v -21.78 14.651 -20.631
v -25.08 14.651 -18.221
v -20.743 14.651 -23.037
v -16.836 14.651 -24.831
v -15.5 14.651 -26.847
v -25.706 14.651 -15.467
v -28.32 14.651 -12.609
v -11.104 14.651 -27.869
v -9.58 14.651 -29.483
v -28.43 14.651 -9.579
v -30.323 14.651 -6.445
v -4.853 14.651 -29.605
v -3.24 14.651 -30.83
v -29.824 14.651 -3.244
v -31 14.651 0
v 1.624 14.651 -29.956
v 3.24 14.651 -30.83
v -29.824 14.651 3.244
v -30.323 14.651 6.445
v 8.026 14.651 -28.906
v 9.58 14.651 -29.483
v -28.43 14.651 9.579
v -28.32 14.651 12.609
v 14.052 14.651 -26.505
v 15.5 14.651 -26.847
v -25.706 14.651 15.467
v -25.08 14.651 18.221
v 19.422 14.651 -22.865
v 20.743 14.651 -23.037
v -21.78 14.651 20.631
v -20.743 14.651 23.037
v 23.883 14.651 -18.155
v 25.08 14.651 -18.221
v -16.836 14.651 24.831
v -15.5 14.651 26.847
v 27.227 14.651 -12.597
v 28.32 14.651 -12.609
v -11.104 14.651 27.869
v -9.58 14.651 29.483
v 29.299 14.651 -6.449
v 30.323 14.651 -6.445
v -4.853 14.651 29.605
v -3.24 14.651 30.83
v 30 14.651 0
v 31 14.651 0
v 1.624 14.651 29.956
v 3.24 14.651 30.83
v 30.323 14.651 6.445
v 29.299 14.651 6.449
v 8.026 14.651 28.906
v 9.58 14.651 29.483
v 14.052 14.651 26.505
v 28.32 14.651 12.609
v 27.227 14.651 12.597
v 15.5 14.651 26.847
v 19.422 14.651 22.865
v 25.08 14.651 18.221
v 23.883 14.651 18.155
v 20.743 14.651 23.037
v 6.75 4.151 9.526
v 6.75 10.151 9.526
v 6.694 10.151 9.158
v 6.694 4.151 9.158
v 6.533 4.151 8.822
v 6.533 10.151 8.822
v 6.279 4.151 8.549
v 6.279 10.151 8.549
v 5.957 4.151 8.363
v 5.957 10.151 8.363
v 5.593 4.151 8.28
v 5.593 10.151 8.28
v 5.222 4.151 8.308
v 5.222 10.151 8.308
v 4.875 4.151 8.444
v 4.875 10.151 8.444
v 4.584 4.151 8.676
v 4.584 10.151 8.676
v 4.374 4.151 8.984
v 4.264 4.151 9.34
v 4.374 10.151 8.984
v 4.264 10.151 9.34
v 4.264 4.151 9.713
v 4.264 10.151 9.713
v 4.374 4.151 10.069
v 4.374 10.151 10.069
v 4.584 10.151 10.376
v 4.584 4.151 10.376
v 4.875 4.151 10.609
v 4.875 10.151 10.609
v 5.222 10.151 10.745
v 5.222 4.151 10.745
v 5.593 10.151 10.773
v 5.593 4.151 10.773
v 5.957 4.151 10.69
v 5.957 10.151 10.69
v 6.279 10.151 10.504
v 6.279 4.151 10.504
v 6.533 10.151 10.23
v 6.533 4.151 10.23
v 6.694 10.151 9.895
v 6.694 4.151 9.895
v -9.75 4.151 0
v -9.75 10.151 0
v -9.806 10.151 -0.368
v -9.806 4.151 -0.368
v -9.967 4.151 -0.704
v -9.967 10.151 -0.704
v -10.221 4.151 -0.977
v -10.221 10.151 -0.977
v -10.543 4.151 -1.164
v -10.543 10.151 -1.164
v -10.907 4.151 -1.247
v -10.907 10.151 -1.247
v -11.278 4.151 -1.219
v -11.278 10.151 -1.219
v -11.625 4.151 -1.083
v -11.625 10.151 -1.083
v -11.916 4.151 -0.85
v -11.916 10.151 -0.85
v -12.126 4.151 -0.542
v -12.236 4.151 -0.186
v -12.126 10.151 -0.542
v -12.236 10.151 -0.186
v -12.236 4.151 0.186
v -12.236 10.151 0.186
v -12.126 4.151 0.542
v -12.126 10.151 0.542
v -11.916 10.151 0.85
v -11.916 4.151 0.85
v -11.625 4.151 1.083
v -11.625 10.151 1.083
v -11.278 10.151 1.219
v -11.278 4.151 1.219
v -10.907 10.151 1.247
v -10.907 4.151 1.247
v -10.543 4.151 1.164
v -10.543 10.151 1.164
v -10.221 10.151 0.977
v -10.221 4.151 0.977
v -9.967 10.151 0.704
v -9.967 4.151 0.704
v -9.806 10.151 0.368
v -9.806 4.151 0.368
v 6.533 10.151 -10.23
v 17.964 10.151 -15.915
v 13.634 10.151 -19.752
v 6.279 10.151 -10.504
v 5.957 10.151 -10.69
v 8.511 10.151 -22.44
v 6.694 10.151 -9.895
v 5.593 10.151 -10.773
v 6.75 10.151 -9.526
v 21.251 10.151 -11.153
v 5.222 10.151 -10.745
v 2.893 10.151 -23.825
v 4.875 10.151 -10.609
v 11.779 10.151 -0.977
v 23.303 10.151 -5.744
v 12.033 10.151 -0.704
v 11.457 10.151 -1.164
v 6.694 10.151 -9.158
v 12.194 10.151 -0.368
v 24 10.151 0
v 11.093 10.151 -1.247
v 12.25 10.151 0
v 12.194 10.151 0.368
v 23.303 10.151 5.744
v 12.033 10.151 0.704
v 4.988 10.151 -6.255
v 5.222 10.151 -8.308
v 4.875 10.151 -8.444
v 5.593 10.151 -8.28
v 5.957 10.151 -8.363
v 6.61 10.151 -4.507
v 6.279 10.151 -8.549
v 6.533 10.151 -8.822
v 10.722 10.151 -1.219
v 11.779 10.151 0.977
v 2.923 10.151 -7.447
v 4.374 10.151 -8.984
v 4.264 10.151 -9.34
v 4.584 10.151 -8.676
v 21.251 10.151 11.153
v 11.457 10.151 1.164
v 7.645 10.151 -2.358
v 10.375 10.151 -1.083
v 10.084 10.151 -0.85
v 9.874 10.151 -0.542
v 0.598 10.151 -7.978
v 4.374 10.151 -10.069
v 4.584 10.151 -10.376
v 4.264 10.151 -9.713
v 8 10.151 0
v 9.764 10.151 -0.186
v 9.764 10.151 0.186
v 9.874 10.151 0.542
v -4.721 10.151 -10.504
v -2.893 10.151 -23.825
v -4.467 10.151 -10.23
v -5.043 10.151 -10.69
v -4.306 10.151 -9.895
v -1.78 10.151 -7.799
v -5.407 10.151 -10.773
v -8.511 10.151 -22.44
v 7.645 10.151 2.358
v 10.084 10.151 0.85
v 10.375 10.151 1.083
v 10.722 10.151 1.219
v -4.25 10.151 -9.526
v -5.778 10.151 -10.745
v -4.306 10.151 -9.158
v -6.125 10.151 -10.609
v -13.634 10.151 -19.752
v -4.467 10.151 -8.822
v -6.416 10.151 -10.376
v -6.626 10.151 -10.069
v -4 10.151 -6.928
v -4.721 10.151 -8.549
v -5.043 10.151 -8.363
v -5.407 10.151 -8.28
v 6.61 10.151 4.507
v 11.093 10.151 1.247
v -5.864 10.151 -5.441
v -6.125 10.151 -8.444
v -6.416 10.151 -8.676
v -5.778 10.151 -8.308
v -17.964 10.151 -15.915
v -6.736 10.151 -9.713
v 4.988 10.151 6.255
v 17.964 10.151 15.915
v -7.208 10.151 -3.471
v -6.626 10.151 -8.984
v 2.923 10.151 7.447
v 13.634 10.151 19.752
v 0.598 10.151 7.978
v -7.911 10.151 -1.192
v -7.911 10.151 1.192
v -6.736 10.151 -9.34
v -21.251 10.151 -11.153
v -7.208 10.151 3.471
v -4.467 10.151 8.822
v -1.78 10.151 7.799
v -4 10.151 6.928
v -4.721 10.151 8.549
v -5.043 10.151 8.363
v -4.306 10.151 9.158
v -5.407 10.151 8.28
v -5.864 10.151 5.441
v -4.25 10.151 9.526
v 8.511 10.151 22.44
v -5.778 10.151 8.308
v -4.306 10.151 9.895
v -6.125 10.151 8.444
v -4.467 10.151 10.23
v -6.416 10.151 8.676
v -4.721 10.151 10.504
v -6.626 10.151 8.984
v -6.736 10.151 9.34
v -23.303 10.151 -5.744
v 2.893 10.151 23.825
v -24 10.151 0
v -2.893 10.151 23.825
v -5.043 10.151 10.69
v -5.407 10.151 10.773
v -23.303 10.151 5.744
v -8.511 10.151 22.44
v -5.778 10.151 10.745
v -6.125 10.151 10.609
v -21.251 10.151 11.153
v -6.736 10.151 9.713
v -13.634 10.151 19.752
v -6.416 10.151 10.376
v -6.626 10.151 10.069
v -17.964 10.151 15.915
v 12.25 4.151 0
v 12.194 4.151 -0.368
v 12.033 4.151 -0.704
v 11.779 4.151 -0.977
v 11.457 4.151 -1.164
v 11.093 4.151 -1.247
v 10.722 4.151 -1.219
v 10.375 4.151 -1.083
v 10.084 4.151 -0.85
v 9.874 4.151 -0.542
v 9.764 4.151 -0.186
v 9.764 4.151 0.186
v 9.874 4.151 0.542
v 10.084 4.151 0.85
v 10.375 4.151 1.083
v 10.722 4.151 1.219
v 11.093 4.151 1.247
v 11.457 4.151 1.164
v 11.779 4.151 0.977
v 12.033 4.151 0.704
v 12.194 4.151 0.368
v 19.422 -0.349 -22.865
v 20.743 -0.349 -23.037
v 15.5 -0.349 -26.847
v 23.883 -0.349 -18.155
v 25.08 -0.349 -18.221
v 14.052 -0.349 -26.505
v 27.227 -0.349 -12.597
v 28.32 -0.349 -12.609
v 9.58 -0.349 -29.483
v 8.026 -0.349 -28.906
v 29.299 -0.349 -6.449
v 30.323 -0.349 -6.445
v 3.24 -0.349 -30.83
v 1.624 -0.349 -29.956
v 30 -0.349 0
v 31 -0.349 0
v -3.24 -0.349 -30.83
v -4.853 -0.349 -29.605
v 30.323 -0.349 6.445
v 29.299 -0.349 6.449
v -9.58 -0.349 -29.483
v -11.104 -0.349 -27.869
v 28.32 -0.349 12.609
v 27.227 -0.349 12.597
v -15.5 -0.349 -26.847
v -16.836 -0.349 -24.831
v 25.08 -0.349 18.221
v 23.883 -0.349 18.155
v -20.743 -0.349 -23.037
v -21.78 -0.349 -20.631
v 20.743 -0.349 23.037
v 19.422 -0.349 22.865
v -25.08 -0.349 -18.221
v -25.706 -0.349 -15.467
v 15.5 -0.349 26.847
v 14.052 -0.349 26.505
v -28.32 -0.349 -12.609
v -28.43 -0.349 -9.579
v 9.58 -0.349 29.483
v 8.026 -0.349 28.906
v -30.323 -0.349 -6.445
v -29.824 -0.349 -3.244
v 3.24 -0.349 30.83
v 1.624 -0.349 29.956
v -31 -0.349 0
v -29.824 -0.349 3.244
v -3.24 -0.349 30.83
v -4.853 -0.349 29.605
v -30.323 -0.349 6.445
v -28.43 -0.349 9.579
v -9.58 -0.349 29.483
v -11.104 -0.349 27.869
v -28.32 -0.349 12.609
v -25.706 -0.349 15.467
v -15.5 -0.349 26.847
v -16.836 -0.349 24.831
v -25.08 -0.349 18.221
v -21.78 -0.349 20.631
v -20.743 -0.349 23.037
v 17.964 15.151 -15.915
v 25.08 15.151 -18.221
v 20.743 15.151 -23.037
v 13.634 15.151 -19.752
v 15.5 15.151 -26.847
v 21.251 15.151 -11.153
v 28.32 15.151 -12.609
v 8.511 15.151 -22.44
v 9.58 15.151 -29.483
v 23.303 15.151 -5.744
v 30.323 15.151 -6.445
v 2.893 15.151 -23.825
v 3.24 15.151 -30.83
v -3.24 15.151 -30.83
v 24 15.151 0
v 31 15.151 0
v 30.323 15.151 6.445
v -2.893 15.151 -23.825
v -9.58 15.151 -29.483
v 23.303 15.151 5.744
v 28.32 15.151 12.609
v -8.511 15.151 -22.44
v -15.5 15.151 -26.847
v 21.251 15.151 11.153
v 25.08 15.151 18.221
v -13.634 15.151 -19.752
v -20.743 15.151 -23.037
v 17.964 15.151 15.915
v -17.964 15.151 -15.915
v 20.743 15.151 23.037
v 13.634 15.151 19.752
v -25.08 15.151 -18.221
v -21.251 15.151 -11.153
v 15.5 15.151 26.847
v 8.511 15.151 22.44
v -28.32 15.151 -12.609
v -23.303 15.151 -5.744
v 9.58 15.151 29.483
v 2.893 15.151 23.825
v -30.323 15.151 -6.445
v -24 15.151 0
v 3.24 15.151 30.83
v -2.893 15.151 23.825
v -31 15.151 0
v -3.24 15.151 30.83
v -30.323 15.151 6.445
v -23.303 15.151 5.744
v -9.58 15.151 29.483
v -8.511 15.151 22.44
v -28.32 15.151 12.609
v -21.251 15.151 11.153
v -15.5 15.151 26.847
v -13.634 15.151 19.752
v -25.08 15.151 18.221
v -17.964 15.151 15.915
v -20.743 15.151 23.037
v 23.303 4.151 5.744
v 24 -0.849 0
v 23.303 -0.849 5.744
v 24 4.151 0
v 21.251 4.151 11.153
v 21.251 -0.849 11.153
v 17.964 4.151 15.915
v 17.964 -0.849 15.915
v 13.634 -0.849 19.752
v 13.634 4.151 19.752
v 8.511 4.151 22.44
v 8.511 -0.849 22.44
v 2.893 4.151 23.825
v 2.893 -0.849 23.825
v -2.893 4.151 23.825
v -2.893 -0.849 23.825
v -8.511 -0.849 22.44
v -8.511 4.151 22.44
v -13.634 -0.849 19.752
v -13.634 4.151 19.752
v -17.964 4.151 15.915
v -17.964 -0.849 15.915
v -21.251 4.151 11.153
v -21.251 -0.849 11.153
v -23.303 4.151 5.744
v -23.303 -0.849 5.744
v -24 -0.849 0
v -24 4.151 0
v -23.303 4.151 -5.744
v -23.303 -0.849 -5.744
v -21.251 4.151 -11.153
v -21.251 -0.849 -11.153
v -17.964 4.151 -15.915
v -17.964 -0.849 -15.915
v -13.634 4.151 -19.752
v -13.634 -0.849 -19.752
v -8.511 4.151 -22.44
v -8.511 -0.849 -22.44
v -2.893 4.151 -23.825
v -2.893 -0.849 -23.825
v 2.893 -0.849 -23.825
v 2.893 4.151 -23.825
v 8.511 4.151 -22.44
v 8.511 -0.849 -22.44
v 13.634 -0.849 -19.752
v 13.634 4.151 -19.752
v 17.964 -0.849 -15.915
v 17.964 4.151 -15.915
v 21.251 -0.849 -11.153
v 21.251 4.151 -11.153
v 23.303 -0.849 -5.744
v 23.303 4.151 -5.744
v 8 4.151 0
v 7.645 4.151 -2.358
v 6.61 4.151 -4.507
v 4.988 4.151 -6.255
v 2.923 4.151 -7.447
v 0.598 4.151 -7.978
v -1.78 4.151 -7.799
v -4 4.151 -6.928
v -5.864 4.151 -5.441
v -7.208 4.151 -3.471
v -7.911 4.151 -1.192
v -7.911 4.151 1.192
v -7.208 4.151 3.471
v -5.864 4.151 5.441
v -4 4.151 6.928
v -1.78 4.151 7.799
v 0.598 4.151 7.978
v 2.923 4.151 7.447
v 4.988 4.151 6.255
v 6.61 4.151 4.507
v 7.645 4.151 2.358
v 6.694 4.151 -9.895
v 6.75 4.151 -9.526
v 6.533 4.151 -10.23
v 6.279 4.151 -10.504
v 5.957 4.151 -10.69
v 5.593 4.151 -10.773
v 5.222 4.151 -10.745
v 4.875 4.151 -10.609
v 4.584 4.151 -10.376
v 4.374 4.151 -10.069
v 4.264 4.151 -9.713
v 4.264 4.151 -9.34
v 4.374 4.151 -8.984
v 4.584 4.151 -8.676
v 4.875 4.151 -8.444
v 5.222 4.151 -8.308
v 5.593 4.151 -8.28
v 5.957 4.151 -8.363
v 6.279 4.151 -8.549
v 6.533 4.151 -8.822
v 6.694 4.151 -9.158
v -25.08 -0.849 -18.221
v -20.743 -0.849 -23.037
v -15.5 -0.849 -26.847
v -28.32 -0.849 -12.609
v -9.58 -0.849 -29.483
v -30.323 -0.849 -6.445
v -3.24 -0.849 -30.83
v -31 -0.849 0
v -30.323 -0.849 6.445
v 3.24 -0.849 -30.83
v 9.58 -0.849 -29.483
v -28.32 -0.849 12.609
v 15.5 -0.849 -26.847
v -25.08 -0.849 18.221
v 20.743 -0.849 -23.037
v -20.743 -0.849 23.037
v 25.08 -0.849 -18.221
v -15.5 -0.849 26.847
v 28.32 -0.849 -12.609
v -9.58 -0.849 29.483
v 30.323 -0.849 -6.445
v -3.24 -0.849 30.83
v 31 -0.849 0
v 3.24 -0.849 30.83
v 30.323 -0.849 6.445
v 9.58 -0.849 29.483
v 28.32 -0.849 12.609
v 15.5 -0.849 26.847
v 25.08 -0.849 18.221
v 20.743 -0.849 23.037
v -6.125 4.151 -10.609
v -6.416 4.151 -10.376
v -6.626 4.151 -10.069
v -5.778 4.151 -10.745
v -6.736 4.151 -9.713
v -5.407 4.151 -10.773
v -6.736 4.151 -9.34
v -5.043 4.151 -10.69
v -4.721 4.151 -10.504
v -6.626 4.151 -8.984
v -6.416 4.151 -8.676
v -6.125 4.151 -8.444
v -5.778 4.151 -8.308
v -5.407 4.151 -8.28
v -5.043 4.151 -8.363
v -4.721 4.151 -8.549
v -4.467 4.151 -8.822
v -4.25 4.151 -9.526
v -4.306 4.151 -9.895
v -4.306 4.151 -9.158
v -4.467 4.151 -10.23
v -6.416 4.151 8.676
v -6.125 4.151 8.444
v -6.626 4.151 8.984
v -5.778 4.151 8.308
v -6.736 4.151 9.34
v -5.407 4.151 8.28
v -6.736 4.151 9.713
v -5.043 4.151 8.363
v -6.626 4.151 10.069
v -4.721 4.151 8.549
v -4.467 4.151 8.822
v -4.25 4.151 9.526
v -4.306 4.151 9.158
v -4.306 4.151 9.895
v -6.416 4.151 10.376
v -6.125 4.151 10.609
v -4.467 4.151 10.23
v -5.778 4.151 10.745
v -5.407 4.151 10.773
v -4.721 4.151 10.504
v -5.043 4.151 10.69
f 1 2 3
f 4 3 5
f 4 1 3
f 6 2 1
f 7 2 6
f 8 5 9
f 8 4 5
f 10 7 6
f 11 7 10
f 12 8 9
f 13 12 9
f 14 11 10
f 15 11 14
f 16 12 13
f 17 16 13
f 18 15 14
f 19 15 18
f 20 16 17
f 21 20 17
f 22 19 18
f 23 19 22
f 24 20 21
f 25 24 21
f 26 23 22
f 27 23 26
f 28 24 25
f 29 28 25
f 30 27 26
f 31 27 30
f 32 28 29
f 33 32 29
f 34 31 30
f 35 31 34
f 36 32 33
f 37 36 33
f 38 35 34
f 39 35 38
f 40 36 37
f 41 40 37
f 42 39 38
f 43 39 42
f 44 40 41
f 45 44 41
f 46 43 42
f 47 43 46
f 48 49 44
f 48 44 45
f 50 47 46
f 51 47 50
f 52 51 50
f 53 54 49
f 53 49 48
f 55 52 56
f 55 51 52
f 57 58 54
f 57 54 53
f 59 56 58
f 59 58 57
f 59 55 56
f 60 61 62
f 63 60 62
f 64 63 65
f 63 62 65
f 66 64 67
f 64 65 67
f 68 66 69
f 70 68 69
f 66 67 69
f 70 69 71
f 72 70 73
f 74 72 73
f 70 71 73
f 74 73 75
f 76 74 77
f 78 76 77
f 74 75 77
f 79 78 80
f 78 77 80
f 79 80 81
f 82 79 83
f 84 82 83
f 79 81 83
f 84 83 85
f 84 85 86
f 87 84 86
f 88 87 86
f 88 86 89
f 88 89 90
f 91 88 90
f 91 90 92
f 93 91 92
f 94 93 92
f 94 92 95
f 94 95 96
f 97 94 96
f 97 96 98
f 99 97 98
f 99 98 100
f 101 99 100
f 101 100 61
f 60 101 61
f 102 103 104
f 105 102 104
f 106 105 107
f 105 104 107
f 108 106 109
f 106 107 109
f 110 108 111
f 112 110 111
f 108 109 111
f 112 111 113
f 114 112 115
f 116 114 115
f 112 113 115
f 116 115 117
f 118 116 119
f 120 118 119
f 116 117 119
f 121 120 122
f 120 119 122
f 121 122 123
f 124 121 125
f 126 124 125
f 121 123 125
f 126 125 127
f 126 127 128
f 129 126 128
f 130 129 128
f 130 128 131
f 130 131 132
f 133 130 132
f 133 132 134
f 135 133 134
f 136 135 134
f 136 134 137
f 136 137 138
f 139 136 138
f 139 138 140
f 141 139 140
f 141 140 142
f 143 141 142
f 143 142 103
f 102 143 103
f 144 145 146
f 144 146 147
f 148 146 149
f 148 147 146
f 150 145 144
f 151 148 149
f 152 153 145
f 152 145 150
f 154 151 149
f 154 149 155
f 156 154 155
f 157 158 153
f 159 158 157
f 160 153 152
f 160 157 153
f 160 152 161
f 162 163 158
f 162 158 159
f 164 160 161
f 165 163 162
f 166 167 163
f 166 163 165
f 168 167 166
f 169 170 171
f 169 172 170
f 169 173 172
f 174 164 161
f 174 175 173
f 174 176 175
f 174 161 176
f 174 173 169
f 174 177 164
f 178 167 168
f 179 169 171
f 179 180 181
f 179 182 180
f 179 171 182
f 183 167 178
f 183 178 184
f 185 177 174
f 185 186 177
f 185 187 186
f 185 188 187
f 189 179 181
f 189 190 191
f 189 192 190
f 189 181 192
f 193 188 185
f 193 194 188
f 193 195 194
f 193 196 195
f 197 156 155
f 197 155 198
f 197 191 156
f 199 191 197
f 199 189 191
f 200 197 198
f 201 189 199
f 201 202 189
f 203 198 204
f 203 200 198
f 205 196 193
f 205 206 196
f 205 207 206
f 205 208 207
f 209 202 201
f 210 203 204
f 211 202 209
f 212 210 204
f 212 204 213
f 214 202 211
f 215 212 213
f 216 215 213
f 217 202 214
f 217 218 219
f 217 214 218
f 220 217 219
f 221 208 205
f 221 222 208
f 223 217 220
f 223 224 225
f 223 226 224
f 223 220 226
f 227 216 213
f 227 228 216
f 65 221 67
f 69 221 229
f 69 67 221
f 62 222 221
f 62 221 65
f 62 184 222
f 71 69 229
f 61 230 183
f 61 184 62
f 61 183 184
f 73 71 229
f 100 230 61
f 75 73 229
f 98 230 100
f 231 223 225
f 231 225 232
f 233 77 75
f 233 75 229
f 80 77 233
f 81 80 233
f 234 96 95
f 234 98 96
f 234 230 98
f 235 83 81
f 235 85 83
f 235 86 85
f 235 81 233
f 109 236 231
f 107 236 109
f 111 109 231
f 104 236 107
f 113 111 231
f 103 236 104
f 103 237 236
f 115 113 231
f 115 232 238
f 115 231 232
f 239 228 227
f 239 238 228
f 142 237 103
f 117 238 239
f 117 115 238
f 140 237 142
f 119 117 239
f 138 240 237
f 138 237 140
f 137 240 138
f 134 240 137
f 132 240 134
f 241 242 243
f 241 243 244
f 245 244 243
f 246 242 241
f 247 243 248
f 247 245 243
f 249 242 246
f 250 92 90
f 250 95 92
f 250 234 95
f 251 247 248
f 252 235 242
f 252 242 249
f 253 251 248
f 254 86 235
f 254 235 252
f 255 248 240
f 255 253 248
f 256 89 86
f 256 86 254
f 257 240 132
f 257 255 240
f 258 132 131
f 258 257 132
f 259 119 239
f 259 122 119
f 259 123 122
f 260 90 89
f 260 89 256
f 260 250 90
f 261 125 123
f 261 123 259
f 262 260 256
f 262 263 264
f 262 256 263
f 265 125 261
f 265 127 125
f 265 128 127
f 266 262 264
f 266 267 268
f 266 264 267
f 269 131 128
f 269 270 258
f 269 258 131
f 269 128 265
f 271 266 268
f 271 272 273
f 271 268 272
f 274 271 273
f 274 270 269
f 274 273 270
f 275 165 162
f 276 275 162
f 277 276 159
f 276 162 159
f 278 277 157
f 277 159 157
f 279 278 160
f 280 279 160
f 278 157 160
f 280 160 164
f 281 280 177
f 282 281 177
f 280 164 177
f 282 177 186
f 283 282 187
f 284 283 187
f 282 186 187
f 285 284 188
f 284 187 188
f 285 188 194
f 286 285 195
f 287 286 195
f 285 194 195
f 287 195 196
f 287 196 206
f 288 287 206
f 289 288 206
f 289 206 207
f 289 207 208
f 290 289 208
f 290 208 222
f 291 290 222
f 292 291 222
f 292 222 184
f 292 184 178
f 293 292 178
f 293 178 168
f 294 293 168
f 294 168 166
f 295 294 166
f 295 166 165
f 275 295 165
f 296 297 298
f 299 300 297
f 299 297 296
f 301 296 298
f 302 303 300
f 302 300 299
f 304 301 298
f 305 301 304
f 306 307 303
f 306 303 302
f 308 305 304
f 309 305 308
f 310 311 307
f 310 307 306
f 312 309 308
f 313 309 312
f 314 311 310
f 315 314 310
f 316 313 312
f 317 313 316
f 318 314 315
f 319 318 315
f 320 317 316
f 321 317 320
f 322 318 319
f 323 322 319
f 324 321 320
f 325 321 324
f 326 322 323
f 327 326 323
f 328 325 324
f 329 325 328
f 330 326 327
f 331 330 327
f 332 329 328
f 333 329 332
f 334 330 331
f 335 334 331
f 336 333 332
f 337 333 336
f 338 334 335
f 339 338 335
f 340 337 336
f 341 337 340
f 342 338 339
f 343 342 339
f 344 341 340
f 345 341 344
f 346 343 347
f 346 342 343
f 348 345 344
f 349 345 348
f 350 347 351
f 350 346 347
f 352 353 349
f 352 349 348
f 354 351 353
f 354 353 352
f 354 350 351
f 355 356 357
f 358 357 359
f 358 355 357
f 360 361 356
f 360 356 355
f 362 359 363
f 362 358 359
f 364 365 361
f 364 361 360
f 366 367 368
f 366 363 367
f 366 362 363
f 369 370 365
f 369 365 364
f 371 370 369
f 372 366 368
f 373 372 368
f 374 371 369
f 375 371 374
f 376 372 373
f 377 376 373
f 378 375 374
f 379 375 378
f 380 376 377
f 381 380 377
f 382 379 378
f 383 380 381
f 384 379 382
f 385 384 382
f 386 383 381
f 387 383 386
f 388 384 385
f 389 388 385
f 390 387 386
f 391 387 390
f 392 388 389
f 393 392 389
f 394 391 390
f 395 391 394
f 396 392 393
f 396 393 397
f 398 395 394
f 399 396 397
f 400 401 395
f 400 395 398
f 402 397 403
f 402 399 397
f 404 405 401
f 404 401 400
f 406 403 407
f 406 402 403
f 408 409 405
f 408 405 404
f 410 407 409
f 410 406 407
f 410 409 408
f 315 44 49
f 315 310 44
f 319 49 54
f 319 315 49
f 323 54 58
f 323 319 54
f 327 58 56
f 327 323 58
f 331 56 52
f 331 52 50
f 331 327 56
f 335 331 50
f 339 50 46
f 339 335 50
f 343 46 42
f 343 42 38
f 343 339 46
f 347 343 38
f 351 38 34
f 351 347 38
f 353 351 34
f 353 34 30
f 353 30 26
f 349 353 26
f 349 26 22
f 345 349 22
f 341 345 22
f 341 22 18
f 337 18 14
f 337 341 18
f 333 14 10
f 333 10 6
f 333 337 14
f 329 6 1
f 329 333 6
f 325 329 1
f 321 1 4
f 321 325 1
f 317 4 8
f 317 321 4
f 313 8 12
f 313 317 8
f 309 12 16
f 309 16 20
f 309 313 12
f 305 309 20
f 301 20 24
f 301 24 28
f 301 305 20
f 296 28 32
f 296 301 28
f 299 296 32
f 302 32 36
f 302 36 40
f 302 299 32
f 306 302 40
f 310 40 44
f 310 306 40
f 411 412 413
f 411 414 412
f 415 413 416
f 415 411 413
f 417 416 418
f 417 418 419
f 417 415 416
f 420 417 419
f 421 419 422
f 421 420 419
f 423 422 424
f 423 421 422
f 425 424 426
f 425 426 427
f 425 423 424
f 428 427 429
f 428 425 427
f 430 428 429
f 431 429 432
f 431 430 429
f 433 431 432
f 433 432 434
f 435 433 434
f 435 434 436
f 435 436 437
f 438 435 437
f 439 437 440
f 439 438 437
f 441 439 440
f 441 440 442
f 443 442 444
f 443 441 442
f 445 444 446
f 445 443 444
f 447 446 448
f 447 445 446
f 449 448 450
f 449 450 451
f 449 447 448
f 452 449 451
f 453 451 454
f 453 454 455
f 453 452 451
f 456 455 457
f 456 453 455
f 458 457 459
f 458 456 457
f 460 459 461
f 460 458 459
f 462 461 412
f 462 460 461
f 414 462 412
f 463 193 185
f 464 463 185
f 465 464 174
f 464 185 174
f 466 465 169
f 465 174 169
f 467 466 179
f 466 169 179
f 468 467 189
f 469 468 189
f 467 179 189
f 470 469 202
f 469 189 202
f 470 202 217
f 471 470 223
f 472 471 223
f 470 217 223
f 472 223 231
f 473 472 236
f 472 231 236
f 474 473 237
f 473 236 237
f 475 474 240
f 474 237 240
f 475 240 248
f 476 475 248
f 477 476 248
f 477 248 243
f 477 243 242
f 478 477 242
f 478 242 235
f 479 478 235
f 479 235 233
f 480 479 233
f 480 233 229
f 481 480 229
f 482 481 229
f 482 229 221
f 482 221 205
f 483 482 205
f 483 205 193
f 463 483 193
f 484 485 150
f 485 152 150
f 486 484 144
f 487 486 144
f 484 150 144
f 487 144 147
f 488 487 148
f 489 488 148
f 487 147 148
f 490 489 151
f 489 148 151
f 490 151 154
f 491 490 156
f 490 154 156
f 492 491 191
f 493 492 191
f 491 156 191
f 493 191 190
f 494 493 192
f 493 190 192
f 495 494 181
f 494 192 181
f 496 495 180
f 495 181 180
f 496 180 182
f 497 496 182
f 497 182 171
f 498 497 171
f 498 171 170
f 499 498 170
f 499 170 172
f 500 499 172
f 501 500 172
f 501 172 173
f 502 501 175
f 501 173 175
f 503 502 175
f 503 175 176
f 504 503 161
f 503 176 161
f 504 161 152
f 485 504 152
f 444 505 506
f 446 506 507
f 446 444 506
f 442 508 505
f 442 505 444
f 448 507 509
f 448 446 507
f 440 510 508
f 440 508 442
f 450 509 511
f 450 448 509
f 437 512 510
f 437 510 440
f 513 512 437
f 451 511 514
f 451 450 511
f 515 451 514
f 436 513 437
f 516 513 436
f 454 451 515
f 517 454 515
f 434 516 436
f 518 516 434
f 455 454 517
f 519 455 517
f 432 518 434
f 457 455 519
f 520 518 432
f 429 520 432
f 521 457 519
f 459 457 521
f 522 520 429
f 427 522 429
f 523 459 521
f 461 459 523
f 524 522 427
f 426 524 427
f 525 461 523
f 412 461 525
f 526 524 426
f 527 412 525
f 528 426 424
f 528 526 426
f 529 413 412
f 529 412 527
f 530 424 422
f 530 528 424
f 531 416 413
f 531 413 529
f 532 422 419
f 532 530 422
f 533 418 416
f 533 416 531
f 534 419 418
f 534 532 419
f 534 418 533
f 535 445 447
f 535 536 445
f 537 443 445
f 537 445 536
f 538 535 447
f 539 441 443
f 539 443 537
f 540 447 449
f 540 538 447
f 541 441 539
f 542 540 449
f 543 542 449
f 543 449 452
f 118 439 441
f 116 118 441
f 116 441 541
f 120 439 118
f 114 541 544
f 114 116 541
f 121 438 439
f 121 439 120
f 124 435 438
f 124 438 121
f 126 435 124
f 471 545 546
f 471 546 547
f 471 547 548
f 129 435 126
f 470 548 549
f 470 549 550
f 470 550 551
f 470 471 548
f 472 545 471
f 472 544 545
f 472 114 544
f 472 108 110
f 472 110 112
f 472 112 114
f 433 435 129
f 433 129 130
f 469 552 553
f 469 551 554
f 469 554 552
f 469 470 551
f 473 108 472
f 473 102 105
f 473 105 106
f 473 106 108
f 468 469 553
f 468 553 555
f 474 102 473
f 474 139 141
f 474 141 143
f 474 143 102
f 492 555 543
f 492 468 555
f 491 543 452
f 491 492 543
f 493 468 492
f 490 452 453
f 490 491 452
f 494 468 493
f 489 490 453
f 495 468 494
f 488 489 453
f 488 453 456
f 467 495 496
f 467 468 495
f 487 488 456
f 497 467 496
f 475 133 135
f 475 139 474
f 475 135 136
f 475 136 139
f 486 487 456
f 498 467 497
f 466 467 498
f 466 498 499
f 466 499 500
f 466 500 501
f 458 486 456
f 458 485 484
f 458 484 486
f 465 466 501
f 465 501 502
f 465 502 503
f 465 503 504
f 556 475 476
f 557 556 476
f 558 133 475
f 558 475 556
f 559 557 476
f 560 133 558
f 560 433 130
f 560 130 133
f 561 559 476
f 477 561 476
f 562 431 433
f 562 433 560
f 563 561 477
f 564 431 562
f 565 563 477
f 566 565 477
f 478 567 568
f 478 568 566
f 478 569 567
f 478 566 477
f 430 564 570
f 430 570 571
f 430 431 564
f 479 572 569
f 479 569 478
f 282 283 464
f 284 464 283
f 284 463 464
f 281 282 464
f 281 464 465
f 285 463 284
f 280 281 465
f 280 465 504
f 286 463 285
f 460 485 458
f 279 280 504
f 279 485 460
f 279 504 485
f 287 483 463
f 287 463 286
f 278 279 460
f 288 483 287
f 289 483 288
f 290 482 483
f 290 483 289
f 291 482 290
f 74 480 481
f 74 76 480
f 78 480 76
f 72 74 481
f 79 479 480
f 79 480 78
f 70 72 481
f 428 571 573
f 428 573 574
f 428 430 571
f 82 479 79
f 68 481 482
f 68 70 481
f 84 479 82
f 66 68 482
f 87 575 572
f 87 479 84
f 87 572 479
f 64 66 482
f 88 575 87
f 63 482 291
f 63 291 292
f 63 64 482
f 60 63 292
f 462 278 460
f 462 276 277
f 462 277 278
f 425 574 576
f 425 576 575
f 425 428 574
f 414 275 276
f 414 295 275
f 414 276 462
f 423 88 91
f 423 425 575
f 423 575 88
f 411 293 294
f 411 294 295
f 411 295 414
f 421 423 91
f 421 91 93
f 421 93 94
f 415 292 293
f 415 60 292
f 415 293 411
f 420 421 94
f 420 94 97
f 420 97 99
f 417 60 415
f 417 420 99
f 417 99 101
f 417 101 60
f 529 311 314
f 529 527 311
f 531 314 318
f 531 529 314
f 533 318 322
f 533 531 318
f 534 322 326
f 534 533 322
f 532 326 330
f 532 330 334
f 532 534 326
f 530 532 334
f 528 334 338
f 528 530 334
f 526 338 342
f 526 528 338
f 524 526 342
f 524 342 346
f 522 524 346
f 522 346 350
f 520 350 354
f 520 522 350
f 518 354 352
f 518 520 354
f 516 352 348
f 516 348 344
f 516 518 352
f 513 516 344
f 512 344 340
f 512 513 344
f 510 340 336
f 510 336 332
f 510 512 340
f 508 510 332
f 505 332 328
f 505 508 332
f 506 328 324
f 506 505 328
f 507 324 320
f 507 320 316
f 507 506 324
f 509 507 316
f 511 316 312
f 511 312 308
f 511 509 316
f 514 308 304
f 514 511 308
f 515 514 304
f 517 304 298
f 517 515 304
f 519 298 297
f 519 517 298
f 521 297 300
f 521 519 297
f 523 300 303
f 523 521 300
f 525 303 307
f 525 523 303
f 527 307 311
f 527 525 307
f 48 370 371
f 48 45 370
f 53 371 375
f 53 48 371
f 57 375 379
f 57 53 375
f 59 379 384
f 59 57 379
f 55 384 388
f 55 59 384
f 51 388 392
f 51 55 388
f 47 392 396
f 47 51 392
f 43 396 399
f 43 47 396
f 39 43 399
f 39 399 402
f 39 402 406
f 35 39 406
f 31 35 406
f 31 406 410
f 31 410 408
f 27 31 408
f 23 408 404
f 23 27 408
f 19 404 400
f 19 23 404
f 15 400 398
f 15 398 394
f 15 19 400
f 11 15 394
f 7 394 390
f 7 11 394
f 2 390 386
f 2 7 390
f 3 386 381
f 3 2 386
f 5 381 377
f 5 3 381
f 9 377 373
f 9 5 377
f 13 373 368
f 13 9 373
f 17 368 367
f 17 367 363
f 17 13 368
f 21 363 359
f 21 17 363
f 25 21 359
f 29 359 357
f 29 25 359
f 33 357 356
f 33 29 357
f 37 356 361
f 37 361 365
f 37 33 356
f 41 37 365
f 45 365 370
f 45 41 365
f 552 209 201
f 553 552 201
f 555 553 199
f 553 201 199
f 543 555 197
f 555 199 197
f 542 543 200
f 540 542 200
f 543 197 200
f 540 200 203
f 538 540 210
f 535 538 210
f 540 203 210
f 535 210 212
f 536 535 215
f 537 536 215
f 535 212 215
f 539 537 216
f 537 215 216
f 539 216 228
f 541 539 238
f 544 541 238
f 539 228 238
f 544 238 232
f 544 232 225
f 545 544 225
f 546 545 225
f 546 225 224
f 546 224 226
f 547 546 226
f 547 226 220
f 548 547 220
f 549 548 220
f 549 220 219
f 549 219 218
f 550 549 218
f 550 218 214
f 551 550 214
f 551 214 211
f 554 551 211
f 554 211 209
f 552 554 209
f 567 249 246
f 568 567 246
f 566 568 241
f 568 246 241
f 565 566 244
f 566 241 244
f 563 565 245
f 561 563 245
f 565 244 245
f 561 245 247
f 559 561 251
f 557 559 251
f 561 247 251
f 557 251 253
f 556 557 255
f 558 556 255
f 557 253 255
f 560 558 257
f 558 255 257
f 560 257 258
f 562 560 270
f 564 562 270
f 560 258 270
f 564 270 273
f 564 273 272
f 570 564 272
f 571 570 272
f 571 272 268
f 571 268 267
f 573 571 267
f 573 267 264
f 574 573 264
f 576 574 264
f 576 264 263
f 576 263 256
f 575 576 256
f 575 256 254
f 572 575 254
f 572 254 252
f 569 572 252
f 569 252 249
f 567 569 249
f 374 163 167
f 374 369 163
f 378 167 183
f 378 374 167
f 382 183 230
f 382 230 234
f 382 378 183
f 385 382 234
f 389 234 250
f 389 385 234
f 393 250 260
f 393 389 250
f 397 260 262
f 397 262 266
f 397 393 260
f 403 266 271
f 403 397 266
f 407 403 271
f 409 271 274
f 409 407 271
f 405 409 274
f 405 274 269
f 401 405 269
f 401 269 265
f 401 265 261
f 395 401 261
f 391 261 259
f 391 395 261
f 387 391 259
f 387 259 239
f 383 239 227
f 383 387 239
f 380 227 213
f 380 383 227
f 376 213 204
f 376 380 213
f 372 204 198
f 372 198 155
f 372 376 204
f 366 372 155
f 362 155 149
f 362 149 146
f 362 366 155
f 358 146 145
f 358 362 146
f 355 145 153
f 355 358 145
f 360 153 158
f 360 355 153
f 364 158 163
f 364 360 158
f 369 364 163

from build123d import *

# Parameters (mm, degrees)
SKETCH2_R          = 8
SKETCH2_R_2        = 1.25
CUT_EXTRUDE1_DEPTH = 15


with BuildPart() as part:
    # Sketch1 → Revolve1 (revolve)
    with BuildSketch(Plane.XY):
        Polygon((0, 10.150862069), (24, 10.150862069), (24, 15.150862069), (31, 15.150862069), (31, 14.650862069), (30, 14.650862069), (30, -0.349137931), (31, -0.349137931), (31, -0.849137931), (24, -0.849137931), (24, 4.150862069), (0, 4.150862069), align=None)
    revolve(axis=Axis((0, 36.012931034, 0), (0, -1, 0)))

    # Sketch2 → Cut-Extrude1 (cut, symmetric)
    with BuildSketch(Plane(origin=(0, 10.150862069, 0), x_dir=(1, 0, 0), z_dir=(0, 1, 0))):
        Circle(SKETCH2_R)
        with Locations((11, 0)):
            Circle(SKETCH2_R_2)
        with Locations((5.5, -9.526279442)):
            Circle(SKETCH2_R_2)
        with Locations((-5.5, -9.526279442)):
            Circle(SKETCH2_R_2)
        with Locations((-11, 0)):
            Circle(SKETCH2_R_2)
        with Locations((-5.5, 9.526279442)):
            Circle(SKETCH2_R_2)
        with Locations((5.5, 9.526279442)):
            Circle(SKETCH2_R_2)
    extrude(amount=CUT_EXTRUDE1_DEPTH, both=True, mode=Mode.SUBTRACT)


solid = part.part
